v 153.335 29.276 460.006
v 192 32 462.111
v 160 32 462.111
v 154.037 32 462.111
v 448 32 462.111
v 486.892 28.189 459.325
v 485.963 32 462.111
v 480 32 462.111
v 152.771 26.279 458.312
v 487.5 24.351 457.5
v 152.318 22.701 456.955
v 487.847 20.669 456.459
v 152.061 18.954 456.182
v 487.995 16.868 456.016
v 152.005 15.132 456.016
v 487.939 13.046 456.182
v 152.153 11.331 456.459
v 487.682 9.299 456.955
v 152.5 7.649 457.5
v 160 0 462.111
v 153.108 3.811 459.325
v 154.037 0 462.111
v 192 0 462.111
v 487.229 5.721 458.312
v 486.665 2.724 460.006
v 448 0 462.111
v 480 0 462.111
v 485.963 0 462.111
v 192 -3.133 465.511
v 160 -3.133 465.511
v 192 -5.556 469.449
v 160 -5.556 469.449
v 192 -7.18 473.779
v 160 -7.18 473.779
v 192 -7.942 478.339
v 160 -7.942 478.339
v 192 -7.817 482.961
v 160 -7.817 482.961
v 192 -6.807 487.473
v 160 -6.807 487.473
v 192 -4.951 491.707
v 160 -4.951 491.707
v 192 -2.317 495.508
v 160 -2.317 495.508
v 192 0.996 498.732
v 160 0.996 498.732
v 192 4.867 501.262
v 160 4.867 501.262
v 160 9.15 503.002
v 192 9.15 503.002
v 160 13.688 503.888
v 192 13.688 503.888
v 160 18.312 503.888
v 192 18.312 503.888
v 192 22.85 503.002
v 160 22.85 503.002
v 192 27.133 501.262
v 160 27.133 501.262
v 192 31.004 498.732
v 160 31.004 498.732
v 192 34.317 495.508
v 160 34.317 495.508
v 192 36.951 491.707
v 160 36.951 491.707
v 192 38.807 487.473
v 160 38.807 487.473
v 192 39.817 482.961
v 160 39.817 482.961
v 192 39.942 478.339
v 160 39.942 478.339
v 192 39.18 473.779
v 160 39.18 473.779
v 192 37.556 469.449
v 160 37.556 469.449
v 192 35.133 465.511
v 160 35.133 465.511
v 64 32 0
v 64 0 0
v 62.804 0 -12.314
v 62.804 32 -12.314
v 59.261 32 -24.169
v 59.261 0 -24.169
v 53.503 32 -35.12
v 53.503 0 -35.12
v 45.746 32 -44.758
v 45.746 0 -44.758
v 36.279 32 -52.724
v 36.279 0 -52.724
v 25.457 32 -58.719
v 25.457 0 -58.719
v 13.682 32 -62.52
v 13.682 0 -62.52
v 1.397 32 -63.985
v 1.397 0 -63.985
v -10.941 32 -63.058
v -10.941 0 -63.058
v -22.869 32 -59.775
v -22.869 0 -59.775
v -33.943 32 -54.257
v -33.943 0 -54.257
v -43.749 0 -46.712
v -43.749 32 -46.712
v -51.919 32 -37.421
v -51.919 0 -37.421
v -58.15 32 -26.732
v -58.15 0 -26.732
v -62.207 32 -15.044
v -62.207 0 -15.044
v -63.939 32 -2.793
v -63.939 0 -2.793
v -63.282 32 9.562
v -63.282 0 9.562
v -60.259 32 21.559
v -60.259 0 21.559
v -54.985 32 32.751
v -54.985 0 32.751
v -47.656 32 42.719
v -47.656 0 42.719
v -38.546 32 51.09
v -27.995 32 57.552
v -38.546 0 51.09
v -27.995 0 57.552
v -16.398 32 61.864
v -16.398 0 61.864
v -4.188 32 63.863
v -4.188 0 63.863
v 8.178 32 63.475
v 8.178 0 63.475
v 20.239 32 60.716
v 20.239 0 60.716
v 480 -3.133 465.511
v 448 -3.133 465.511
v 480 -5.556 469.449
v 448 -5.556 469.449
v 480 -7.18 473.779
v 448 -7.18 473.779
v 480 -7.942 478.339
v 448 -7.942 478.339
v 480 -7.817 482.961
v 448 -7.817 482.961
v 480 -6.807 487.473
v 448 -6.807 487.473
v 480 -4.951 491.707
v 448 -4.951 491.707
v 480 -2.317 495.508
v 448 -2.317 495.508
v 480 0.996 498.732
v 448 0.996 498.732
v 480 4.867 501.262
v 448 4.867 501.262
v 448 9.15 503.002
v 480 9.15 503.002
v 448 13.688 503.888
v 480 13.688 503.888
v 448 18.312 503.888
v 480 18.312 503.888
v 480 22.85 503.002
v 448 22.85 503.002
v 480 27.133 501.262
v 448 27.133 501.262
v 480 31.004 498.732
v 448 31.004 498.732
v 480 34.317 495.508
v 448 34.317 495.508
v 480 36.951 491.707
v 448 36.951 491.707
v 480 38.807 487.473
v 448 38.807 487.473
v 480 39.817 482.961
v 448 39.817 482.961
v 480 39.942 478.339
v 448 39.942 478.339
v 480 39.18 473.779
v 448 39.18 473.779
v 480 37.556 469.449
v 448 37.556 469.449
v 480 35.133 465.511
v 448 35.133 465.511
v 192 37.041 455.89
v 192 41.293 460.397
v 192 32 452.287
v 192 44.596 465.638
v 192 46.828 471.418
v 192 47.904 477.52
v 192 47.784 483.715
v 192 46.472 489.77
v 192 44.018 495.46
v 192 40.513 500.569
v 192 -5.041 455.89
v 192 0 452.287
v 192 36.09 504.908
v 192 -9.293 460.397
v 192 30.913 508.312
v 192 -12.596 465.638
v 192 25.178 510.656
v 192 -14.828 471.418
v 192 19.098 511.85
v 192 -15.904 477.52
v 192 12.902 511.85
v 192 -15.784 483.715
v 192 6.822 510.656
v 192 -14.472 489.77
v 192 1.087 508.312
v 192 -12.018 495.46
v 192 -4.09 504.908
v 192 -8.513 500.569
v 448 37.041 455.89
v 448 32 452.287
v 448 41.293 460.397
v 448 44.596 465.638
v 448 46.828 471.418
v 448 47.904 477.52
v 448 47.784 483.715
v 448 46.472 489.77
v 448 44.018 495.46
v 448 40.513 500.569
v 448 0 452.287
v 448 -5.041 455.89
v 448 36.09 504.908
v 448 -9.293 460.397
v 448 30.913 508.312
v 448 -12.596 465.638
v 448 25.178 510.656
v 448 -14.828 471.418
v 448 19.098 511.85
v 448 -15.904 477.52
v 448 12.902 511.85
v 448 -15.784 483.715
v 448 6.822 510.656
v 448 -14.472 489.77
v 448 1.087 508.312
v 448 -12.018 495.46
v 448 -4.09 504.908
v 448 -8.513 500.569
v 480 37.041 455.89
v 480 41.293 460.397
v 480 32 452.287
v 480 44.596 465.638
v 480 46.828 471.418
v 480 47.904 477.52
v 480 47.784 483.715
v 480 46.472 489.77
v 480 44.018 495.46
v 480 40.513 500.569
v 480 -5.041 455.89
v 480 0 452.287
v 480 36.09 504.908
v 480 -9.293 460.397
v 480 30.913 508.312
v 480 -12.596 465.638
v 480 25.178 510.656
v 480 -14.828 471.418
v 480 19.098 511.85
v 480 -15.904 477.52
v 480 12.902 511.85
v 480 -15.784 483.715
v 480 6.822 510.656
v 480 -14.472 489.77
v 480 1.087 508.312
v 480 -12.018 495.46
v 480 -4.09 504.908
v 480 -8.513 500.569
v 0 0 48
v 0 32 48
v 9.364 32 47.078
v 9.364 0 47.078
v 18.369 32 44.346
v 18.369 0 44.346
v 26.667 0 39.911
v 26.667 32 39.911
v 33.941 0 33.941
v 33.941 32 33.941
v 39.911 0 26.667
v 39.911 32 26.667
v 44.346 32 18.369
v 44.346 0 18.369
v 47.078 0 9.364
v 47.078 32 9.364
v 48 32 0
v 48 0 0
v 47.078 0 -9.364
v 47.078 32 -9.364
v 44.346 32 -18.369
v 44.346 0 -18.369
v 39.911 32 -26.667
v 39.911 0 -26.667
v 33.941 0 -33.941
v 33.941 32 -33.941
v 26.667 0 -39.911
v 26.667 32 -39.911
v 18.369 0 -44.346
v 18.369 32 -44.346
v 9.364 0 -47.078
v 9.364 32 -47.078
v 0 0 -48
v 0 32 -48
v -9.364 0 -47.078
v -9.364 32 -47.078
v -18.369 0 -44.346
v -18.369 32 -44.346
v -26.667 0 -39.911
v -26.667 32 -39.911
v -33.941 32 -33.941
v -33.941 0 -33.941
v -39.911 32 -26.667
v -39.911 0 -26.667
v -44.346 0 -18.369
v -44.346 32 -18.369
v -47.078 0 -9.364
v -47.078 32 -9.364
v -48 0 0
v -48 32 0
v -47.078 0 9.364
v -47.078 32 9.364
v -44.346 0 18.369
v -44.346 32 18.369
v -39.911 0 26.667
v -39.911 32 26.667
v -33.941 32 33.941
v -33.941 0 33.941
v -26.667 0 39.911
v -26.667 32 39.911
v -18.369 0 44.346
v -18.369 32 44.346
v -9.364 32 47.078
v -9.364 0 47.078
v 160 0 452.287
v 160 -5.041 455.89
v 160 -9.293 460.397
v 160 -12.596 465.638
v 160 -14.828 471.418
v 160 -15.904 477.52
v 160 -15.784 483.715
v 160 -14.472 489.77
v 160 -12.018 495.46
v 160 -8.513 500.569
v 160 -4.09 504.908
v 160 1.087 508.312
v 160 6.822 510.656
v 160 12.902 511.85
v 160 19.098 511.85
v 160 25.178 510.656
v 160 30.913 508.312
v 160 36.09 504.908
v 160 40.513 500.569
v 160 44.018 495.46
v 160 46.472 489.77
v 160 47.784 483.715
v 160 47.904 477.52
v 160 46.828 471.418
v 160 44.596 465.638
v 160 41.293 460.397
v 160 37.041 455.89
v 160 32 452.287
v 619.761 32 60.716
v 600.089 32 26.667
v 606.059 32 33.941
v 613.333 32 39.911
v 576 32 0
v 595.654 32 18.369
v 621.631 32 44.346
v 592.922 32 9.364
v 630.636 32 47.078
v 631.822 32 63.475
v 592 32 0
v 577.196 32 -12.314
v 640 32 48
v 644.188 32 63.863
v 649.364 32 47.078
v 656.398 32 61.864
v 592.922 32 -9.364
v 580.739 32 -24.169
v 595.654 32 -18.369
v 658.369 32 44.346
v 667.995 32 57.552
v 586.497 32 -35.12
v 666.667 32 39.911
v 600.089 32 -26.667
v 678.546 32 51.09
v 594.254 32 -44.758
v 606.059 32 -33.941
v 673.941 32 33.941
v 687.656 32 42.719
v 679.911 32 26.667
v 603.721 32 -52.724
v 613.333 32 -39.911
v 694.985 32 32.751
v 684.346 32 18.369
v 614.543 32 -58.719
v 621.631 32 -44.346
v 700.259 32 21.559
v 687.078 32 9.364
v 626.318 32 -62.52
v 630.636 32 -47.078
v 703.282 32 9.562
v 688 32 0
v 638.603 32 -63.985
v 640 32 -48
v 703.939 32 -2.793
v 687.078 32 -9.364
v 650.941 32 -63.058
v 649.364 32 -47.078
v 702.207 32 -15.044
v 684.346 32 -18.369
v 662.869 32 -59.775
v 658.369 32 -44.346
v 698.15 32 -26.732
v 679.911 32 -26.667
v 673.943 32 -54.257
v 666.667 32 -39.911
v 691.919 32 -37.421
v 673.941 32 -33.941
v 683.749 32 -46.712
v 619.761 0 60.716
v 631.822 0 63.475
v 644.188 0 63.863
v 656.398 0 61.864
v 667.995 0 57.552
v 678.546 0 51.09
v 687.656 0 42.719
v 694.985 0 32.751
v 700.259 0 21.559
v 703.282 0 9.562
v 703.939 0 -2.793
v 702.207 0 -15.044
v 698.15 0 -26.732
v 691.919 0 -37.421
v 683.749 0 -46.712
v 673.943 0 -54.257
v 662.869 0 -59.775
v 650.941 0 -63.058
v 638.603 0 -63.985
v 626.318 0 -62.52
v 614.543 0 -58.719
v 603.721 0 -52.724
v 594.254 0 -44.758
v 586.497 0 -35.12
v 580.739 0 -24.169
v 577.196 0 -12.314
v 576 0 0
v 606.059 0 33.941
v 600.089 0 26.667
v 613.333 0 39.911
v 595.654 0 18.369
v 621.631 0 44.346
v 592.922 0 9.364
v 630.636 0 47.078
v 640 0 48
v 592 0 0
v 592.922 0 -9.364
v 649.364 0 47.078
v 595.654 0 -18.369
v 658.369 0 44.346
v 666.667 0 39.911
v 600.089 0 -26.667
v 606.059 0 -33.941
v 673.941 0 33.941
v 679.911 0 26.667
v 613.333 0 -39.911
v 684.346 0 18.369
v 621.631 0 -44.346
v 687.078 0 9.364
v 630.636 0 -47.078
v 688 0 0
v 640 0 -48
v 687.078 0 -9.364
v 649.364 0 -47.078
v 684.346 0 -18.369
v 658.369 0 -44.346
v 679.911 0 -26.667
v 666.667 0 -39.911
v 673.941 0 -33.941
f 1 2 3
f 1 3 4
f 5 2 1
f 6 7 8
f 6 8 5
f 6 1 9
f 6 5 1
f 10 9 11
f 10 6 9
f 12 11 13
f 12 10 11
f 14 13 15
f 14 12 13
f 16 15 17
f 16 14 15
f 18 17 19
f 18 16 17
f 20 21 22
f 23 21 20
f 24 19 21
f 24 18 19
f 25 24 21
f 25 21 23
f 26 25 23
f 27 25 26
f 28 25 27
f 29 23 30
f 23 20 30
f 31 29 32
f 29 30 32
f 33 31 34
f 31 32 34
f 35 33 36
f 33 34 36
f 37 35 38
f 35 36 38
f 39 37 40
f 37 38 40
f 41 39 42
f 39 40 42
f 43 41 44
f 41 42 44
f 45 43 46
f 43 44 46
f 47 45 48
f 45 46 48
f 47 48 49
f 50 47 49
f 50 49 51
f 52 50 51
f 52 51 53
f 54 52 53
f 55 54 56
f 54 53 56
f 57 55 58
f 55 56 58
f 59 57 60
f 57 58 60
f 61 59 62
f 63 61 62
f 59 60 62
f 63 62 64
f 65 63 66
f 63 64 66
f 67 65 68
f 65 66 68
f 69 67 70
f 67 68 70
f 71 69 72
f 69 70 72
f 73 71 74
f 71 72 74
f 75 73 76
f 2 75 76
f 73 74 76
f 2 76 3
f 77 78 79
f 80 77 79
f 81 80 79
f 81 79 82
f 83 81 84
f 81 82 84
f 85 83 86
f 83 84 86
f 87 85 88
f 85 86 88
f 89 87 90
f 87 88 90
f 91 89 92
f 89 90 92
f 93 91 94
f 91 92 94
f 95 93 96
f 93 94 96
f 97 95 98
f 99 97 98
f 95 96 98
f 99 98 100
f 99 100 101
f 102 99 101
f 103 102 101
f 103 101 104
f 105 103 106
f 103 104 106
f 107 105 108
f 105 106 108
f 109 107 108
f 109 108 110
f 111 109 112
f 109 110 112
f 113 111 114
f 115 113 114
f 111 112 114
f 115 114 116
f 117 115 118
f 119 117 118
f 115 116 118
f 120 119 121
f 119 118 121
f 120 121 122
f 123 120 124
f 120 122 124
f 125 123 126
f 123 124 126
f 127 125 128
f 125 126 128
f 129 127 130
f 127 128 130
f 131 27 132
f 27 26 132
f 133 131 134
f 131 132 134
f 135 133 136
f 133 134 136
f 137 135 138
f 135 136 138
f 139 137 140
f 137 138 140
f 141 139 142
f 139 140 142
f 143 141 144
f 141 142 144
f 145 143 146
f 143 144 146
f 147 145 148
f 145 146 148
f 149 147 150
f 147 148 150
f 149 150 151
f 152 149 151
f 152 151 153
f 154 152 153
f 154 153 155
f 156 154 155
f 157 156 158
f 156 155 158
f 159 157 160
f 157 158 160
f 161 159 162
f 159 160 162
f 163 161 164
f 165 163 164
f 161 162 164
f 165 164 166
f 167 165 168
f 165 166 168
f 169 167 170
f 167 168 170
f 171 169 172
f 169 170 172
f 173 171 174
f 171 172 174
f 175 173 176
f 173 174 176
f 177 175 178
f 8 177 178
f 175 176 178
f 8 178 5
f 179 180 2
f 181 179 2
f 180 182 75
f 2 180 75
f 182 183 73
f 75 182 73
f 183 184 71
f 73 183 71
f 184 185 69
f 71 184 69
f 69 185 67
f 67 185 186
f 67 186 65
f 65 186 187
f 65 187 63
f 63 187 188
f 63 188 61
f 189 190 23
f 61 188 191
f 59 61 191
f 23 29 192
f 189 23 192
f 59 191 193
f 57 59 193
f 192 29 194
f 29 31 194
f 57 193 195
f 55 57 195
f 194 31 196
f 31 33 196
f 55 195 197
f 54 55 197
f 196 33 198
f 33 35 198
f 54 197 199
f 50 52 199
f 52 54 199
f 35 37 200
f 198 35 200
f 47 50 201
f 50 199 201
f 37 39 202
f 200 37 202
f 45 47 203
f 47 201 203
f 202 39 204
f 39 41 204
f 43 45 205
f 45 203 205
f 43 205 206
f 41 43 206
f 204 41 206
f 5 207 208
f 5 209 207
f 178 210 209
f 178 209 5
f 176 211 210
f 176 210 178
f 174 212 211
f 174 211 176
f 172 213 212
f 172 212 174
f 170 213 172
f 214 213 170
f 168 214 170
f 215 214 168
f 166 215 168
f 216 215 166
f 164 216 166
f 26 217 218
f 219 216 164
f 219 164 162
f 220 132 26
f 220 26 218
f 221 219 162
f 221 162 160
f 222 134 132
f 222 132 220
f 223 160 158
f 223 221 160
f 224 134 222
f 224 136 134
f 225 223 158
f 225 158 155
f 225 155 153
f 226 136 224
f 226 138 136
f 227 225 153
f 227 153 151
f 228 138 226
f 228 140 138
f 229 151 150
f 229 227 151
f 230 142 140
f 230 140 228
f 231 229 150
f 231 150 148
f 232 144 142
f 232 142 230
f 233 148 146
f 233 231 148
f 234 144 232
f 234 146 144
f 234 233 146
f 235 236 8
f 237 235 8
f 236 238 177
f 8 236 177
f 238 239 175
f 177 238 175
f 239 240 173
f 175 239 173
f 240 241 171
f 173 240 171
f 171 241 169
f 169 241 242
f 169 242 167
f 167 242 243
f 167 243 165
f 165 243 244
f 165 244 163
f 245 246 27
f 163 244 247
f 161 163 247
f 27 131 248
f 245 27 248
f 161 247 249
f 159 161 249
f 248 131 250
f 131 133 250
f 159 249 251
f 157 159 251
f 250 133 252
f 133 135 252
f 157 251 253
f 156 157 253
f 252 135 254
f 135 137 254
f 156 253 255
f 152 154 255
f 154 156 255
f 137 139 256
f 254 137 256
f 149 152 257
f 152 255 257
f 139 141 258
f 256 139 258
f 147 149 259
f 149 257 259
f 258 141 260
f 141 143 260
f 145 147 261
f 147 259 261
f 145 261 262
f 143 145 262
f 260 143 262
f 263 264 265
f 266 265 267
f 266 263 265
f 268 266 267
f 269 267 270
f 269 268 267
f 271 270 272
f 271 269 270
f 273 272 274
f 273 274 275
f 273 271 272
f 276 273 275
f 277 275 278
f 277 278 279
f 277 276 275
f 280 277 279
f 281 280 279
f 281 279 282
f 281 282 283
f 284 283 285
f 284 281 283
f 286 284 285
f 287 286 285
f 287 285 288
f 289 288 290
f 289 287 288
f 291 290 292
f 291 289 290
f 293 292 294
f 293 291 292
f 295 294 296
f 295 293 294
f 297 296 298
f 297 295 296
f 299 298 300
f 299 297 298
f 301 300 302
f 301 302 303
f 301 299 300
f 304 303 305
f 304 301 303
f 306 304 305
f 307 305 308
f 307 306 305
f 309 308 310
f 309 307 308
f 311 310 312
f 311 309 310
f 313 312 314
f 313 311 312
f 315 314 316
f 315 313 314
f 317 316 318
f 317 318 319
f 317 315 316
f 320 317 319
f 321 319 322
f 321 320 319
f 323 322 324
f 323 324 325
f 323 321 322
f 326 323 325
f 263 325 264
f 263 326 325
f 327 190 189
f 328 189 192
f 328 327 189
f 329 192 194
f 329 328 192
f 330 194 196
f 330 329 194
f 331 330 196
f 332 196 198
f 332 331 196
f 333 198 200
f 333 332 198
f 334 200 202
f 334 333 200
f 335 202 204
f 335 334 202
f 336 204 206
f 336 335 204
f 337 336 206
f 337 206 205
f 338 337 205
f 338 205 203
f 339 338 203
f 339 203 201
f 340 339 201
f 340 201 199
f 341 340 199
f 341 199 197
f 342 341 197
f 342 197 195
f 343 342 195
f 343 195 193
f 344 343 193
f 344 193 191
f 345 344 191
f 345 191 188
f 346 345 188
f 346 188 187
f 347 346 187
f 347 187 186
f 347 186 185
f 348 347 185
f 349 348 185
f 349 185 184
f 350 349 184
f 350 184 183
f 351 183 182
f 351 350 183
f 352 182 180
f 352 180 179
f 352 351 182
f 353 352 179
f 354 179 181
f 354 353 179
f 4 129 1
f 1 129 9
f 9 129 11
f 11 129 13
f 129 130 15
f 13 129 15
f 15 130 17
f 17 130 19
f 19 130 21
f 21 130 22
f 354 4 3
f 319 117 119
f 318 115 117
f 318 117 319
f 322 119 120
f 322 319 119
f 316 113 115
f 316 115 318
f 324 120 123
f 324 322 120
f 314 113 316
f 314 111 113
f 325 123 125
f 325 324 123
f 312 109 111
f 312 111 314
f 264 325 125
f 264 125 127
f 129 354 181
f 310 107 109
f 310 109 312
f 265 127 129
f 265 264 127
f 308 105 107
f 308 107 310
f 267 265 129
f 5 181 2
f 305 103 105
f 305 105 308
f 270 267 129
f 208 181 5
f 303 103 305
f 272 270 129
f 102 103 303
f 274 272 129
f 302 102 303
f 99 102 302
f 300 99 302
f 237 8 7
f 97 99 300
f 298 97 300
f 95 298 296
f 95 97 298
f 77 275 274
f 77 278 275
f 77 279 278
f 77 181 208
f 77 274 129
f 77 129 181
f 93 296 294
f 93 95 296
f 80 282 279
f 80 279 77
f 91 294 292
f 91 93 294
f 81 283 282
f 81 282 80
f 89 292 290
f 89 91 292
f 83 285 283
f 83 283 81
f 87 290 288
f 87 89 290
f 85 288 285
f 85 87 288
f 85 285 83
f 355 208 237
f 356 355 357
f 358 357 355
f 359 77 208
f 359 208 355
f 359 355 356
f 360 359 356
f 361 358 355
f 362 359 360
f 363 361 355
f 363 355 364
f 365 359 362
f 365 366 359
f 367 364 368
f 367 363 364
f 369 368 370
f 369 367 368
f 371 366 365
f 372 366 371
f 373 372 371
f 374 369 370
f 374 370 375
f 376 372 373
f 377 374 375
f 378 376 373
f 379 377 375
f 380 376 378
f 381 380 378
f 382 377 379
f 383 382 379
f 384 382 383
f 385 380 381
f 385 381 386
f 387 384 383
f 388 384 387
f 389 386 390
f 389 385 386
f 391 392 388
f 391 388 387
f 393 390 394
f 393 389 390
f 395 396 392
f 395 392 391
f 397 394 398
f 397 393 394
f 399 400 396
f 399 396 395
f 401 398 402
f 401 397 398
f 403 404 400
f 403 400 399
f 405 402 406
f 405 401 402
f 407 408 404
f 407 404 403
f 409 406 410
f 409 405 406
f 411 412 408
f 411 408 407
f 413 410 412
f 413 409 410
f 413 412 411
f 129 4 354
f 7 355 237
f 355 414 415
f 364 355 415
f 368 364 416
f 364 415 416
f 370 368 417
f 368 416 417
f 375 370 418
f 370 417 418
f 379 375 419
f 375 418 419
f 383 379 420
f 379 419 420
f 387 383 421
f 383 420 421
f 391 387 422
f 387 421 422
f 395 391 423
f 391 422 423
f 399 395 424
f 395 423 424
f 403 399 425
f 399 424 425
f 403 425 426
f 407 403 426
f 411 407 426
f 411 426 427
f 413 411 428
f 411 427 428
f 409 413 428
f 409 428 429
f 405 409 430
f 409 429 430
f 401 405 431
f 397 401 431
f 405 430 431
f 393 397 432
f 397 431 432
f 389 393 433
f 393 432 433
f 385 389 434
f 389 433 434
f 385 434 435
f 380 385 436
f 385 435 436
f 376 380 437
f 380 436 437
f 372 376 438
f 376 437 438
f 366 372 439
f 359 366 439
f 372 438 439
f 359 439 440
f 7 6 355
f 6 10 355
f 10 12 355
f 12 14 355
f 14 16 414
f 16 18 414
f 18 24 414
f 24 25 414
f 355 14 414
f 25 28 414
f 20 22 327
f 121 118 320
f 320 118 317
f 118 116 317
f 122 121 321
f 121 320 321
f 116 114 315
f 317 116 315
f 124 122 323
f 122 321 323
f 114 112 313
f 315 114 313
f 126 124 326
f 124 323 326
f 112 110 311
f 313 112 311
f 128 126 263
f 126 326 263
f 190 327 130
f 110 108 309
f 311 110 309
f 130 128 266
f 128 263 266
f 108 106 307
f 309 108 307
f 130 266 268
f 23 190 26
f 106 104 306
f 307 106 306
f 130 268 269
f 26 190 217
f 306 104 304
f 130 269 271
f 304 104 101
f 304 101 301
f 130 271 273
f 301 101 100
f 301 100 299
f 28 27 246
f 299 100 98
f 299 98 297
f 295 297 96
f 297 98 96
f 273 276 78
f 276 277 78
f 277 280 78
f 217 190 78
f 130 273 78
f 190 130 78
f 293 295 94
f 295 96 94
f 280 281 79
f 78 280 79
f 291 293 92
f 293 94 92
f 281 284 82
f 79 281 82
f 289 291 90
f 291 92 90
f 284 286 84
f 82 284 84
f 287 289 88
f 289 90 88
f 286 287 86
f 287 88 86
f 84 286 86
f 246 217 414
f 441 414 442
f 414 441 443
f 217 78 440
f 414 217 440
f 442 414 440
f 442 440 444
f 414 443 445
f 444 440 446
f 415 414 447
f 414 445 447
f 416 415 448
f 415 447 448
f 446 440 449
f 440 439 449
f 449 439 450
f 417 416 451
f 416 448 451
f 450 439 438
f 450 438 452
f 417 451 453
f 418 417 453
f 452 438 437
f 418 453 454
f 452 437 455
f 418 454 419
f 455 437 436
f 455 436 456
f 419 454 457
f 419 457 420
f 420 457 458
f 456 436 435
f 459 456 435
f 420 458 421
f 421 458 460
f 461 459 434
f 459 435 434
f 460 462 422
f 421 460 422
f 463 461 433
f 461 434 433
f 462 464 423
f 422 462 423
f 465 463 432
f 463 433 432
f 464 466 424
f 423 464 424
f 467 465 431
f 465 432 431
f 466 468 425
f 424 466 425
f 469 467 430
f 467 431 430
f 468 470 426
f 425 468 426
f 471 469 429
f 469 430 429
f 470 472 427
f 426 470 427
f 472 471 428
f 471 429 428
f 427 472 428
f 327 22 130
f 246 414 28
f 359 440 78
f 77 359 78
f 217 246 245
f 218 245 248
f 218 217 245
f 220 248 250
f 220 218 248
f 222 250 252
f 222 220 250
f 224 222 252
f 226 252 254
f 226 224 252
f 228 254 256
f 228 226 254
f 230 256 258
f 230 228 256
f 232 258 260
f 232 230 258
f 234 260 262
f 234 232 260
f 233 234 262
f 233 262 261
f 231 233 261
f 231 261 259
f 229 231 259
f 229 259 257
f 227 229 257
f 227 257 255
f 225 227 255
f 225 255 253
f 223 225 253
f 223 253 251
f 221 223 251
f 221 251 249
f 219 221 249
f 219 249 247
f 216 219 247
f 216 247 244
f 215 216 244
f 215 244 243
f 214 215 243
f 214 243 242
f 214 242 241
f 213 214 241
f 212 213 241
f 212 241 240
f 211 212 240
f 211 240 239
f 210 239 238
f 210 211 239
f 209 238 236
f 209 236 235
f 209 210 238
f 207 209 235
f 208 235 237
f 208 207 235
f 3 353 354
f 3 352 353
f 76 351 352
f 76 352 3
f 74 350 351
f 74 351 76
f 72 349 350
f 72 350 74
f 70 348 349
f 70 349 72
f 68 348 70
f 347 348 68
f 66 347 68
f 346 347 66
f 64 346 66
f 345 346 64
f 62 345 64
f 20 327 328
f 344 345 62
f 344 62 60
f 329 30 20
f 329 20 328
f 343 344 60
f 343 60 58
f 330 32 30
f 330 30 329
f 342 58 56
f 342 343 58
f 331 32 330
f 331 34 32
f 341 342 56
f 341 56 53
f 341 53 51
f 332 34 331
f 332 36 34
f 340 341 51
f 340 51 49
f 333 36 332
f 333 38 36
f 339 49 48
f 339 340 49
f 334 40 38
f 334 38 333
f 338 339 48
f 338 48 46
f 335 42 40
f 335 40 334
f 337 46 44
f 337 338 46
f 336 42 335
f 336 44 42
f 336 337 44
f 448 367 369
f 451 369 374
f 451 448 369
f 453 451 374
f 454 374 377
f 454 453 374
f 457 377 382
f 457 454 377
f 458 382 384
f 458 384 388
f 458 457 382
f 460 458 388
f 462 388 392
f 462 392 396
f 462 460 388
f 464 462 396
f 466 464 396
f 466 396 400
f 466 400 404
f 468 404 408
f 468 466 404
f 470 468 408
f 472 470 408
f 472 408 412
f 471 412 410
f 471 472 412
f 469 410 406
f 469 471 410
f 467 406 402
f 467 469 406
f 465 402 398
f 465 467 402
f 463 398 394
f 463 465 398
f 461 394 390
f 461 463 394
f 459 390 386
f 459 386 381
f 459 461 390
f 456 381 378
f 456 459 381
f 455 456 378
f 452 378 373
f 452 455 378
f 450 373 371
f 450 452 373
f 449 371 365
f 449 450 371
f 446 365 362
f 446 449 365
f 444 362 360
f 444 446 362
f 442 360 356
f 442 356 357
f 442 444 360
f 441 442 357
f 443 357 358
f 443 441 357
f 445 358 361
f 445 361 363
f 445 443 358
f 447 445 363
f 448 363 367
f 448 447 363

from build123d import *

# Parameters (mm, degrees)
SKETCH1_R               = 48
BOSS_EXTRUDE1_DEPTH     = 32
SKETCH2_R               = 32
SKETCH2_R_2             = 24
BOSS_EXTRUDE2_DEPTH     = 32
BOSS_EXTRUDE3_START     = 32
SKETCH3_R               = 32
SKETCH3_R_2             = 24
BOSS_EXTRUDE3_DEPTH     = 32
CUT_EXTRUDE1_DEPTH      = 32
CUT_EXTRUDE1_DEPTH_BACK = 689
SKETCH4_R               = 24


with BuildPart() as part:
    # Sketch1 → Boss-Extrude1 (new body)
    with BuildSketch(Plane(origin=(0, 0, 0), x_dir=(1, 0, 0), z_dir=(0, 1, 0))):
        with BuildLine():
            ThreePointArc((64, 0), (-51.919499851, 37.421458218), (20.238577025, -60.715731075))
            Line((20.238577025, -60.715731075), (160, -480))
            Line((160, -480), (480, -480))
            Line((480, -480), (619.761422975, -60.715731075))
            ThreePointArc((619.761422975, -60.715731075), (691.919499851, 37.421458218), (576, 0))
            Line((576, 0), (64, 0))
        make_face()
        with Locations(Location((0, 0, 0), (0, 0, 270))):
            Circle(SKETCH1_R, mode=Mode.SUBTRACT)
        with Locations(Location((640, 0, 0), (0, 0, 270))):
            Circle(SKETCH1_R, mode=Mode.SUBTRACT)
    extrude(amount=BOSS_EXTRUDE1_DEPTH)

    # Sketch2 → Boss-Extrude2 (add)
    with BuildSketch(Plane(origin=(160, 0, 0), x_dir=(0, -1, 0), z_dir=(-1, 0, 0))):
        with Locations((-16, 480)):
            Circle(SKETCH2_R)
        with Locations((-16, 480)):
            Circle(SKETCH2_R_2, mode=Mode.SUBTRACT)
    extrude(amount=-BOSS_EXTRUDE2_DEPTH)

    # Sketch3 → Boss-Extrude3 (add)
    with BuildSketch(Plane(origin=(480, 0, 0), x_dir=(0, -1, 0), z_dir=(-1, 0, 0)).offset(BOSS_EXTRUDE3_START)):
        with Locations((-16, 480)):
            Circle(SKETCH3_R)
        with Locations((-16, 480)):
            Circle(SKETCH3_R_2, mode=Mode.SUBTRACT)
    extrude(amount=-BOSS_EXTRUDE3_DEPTH)

    # Sketch4 → Cut-Extrude1 (cut, two sides: drawn at the far end of the back side and taken through both)
    with BuildSketch(Plane(origin=(160, 0, 0), x_dir=(0, -1, 0), z_dir=(-1, 0, 0)).offset(-CUT_EXTRUDE1_DEPTH_BACK)):
        with Locations(Location((-16, 480, 0), (0, 0, 228.189685104))):
            Circle(SKETCH4_R)
    extrude(amount=CUT_EXTRUDE1_DEPTH + CUT_EXTRUDE1_DEPTH_BACK, mode=Mode.SUBTRACT)


solid = part.part
